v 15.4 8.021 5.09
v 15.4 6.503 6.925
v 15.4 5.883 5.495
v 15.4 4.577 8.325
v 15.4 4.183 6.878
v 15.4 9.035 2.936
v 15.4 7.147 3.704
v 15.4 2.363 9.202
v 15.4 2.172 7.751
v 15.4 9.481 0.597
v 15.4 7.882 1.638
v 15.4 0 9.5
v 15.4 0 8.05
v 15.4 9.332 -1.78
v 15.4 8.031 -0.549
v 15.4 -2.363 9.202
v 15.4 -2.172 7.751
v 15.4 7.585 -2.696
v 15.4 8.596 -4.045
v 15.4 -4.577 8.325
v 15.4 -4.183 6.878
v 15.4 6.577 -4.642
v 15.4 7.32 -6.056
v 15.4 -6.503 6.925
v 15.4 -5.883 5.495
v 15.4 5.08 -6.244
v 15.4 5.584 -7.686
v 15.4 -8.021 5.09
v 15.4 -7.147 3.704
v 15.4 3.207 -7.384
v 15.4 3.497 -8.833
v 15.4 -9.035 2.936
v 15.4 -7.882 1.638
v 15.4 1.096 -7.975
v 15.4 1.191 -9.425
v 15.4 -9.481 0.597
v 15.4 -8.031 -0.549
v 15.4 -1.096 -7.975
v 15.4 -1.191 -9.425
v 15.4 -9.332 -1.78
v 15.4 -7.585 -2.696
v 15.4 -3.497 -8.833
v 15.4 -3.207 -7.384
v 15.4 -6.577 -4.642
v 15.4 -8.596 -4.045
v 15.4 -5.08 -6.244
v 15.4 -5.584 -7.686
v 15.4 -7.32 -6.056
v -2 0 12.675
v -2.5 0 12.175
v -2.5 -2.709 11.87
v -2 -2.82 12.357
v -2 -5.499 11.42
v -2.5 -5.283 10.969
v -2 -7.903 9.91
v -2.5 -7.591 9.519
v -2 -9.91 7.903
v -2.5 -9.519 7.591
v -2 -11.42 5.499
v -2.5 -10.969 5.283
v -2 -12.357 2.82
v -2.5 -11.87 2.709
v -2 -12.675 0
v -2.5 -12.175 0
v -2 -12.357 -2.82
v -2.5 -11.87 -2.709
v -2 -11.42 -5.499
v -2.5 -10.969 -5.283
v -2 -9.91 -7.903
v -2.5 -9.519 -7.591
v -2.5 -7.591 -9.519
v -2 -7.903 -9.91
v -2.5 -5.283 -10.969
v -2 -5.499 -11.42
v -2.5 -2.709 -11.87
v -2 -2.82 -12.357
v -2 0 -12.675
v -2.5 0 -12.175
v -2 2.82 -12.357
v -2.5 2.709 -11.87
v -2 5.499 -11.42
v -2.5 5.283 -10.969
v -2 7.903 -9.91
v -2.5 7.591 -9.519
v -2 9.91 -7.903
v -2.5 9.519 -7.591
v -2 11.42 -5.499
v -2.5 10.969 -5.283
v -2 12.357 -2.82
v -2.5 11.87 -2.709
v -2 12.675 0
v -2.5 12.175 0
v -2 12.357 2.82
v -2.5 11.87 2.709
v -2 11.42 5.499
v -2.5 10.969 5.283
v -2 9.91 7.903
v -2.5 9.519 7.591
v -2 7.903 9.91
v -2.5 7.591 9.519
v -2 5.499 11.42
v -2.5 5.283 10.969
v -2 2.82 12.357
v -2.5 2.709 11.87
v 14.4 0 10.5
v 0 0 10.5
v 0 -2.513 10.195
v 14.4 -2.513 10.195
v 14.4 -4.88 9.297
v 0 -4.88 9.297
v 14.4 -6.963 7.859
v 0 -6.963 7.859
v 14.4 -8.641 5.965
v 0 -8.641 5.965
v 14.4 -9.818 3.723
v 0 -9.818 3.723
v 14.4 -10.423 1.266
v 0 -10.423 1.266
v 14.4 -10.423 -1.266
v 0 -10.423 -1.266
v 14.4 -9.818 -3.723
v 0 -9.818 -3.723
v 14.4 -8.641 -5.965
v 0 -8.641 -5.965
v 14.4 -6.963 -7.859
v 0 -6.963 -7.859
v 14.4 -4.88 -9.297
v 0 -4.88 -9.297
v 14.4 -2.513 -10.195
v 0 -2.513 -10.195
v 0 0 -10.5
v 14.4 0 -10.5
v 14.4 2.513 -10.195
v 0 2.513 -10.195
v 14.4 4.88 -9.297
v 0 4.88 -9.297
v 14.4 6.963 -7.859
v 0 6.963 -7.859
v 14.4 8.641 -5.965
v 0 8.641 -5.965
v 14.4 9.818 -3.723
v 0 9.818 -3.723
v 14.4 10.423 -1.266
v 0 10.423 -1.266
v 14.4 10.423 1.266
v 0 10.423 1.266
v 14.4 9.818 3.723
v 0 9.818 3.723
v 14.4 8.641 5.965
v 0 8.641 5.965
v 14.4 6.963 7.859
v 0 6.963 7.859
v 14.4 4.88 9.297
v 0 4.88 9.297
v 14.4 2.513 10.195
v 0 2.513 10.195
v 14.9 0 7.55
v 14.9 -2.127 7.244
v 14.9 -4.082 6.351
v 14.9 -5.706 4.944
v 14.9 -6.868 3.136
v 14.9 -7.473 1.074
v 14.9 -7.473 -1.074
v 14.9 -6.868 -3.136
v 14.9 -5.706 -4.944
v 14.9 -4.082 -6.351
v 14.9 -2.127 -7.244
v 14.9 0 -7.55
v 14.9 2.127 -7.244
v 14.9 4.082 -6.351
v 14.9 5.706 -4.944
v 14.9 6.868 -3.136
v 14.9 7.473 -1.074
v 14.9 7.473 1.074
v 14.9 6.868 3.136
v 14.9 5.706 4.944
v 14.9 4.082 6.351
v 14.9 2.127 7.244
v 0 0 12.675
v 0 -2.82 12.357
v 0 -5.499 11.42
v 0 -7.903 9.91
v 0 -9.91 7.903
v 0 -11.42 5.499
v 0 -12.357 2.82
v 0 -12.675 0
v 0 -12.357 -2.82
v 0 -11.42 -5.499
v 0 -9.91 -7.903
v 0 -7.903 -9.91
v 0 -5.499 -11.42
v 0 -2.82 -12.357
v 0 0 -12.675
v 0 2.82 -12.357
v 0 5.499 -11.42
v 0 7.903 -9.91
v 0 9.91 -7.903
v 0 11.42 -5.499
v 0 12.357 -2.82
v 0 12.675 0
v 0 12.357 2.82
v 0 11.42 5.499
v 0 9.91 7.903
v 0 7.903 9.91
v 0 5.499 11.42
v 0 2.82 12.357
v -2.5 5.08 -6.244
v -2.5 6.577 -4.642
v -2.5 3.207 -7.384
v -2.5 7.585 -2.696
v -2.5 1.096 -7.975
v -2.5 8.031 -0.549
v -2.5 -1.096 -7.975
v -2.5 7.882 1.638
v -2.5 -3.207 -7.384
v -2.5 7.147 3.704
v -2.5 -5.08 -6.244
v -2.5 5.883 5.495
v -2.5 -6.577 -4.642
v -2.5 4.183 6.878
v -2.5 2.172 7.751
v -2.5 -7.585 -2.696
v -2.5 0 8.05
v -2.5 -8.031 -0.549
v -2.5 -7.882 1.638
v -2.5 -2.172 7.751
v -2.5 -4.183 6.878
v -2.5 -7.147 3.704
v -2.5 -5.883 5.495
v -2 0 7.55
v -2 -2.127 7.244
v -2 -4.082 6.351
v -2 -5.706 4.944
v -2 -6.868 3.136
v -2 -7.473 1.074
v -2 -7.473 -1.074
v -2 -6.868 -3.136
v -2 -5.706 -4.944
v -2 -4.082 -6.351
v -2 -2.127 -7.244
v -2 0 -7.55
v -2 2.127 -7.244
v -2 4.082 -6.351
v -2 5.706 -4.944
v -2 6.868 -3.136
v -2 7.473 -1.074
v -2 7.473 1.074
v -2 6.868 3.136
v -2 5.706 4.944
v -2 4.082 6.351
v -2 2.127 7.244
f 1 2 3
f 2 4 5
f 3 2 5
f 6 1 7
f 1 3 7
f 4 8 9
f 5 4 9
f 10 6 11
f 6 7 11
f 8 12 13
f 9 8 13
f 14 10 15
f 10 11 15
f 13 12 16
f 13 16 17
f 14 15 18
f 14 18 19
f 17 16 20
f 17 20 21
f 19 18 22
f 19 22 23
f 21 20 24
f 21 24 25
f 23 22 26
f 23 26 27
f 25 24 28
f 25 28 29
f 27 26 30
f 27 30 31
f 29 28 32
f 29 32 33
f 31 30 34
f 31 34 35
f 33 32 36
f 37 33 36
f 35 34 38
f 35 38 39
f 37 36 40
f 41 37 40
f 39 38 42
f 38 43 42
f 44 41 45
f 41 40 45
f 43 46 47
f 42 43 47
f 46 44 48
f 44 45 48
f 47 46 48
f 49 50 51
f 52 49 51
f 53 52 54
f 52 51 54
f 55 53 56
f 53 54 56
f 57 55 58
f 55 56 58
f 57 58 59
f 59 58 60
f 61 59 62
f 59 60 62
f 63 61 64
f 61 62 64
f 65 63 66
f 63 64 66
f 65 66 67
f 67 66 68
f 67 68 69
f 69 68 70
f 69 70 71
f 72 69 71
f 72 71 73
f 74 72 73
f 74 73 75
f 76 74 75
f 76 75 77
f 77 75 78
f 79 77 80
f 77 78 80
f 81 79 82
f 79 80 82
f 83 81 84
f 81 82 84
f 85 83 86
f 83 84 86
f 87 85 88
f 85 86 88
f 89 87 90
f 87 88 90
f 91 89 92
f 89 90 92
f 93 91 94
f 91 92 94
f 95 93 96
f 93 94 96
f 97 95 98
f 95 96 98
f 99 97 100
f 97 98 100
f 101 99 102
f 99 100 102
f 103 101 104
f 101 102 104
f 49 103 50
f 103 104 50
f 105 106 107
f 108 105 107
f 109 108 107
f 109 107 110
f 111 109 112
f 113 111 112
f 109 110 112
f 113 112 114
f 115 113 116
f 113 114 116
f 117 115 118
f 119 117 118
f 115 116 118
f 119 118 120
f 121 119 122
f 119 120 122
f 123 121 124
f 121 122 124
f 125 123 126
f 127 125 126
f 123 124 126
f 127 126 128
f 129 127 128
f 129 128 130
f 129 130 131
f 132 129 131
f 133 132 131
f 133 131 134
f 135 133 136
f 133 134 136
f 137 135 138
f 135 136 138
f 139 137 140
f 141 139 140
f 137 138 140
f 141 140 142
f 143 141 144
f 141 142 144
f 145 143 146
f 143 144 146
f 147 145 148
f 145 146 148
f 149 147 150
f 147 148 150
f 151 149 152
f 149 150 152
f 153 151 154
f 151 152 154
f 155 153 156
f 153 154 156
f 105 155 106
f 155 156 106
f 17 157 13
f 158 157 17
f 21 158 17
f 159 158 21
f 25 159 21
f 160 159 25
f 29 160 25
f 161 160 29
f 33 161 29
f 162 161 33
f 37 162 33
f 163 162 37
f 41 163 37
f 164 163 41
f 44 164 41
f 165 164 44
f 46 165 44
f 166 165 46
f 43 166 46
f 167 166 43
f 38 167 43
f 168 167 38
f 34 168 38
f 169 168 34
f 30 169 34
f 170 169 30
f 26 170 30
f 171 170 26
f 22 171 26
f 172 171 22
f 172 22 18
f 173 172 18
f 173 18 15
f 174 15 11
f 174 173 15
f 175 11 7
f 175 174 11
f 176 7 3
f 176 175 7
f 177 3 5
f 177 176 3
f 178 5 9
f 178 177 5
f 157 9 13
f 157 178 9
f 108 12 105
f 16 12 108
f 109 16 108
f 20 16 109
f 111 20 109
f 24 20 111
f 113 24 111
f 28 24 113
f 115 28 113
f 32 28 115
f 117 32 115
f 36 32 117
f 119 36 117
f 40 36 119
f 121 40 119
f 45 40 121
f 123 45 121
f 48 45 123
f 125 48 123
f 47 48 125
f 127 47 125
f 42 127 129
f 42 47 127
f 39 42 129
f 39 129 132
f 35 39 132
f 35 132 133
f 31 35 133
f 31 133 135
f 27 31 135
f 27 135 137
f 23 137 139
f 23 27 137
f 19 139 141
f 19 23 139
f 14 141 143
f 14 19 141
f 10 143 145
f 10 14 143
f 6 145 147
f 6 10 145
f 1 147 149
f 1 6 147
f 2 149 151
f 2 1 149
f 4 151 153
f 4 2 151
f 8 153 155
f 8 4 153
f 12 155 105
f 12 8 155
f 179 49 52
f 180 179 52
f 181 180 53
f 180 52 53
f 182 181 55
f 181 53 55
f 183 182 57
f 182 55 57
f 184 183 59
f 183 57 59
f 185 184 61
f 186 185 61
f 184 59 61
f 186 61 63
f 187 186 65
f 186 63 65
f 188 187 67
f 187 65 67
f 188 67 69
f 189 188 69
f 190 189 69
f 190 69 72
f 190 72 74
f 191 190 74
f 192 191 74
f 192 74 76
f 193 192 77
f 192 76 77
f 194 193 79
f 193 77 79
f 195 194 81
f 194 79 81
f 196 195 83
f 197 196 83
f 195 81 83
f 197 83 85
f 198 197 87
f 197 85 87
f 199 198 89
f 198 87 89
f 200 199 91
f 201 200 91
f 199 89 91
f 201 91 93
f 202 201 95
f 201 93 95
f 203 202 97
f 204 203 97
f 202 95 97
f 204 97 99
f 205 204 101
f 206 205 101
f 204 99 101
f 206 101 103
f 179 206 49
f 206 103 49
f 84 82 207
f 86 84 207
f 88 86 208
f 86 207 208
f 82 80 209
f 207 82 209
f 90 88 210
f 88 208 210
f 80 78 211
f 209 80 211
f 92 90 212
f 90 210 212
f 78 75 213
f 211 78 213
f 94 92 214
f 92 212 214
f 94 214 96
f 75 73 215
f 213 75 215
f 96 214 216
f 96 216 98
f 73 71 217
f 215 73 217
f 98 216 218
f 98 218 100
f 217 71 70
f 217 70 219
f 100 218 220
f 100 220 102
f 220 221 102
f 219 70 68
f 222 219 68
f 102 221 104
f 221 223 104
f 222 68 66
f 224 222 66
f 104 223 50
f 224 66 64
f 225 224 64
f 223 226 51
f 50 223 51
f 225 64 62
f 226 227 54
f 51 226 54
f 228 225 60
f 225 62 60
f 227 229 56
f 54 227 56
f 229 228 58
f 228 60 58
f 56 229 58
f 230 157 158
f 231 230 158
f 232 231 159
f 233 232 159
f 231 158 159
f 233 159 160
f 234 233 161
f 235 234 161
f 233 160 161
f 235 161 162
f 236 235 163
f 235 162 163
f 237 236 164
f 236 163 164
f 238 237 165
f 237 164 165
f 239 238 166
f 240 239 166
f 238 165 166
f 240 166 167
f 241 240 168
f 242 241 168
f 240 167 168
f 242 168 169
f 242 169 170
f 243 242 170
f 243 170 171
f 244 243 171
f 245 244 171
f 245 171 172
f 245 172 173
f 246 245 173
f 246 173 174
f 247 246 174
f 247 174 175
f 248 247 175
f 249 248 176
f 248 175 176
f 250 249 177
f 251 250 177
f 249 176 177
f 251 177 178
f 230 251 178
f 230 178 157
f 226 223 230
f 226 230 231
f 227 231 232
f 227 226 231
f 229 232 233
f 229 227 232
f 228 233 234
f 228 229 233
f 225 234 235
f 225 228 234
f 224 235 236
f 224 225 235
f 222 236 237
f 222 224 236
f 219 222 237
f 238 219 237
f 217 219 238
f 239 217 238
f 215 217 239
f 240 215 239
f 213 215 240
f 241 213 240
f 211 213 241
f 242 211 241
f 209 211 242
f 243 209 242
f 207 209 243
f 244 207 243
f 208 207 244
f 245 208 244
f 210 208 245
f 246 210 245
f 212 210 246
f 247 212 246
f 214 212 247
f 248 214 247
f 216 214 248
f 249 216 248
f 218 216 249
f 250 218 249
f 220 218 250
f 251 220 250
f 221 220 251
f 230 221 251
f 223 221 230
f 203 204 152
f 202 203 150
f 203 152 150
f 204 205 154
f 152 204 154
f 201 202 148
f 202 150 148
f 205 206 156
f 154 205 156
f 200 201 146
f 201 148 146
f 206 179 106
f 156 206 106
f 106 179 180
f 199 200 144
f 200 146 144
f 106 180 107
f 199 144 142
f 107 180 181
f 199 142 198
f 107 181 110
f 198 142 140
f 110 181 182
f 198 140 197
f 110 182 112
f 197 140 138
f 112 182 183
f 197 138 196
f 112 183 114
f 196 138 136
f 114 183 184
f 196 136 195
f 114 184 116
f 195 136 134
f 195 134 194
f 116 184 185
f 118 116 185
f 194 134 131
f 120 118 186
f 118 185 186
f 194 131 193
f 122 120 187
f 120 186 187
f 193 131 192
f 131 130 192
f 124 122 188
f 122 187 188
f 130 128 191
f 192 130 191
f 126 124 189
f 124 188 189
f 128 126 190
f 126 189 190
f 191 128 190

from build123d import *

# Parameters (mm, degrees)
F2_SIZE = 1
F3_SIZE = 0.5


with BuildPart() as f1:
    # F0 (on Front) → F1 (revolve)
    with BuildSketch(Plane.XZ):
        Polygon((15.4, 10.5), (0, 10.5), (0, 12.675), (-2.5, 12.675), (-2.5, 7.55), (15.4, 7.55), align=None)
    revolve(axis=Axis((7.2899, 0, 0), (1, 0, 0)))

    # F2
    f2_edges = [f1.edges().sort_by_distance(p)[0] for p in [
        (15.4, 0, -10.5),
    ]]
    chamfer(f2_edges, length=F2_SIZE)

    # F3
    f3_edges = [f1.edges().sort_by_distance(p)[0] for p in [
        (-2.5, 0, -12.675),
        (-2.5, 0, -7.55),
        (15.4, 0, -7.55),
    ]]
    chamfer(f3_edges, length=F3_SIZE)


solid = f1.part
